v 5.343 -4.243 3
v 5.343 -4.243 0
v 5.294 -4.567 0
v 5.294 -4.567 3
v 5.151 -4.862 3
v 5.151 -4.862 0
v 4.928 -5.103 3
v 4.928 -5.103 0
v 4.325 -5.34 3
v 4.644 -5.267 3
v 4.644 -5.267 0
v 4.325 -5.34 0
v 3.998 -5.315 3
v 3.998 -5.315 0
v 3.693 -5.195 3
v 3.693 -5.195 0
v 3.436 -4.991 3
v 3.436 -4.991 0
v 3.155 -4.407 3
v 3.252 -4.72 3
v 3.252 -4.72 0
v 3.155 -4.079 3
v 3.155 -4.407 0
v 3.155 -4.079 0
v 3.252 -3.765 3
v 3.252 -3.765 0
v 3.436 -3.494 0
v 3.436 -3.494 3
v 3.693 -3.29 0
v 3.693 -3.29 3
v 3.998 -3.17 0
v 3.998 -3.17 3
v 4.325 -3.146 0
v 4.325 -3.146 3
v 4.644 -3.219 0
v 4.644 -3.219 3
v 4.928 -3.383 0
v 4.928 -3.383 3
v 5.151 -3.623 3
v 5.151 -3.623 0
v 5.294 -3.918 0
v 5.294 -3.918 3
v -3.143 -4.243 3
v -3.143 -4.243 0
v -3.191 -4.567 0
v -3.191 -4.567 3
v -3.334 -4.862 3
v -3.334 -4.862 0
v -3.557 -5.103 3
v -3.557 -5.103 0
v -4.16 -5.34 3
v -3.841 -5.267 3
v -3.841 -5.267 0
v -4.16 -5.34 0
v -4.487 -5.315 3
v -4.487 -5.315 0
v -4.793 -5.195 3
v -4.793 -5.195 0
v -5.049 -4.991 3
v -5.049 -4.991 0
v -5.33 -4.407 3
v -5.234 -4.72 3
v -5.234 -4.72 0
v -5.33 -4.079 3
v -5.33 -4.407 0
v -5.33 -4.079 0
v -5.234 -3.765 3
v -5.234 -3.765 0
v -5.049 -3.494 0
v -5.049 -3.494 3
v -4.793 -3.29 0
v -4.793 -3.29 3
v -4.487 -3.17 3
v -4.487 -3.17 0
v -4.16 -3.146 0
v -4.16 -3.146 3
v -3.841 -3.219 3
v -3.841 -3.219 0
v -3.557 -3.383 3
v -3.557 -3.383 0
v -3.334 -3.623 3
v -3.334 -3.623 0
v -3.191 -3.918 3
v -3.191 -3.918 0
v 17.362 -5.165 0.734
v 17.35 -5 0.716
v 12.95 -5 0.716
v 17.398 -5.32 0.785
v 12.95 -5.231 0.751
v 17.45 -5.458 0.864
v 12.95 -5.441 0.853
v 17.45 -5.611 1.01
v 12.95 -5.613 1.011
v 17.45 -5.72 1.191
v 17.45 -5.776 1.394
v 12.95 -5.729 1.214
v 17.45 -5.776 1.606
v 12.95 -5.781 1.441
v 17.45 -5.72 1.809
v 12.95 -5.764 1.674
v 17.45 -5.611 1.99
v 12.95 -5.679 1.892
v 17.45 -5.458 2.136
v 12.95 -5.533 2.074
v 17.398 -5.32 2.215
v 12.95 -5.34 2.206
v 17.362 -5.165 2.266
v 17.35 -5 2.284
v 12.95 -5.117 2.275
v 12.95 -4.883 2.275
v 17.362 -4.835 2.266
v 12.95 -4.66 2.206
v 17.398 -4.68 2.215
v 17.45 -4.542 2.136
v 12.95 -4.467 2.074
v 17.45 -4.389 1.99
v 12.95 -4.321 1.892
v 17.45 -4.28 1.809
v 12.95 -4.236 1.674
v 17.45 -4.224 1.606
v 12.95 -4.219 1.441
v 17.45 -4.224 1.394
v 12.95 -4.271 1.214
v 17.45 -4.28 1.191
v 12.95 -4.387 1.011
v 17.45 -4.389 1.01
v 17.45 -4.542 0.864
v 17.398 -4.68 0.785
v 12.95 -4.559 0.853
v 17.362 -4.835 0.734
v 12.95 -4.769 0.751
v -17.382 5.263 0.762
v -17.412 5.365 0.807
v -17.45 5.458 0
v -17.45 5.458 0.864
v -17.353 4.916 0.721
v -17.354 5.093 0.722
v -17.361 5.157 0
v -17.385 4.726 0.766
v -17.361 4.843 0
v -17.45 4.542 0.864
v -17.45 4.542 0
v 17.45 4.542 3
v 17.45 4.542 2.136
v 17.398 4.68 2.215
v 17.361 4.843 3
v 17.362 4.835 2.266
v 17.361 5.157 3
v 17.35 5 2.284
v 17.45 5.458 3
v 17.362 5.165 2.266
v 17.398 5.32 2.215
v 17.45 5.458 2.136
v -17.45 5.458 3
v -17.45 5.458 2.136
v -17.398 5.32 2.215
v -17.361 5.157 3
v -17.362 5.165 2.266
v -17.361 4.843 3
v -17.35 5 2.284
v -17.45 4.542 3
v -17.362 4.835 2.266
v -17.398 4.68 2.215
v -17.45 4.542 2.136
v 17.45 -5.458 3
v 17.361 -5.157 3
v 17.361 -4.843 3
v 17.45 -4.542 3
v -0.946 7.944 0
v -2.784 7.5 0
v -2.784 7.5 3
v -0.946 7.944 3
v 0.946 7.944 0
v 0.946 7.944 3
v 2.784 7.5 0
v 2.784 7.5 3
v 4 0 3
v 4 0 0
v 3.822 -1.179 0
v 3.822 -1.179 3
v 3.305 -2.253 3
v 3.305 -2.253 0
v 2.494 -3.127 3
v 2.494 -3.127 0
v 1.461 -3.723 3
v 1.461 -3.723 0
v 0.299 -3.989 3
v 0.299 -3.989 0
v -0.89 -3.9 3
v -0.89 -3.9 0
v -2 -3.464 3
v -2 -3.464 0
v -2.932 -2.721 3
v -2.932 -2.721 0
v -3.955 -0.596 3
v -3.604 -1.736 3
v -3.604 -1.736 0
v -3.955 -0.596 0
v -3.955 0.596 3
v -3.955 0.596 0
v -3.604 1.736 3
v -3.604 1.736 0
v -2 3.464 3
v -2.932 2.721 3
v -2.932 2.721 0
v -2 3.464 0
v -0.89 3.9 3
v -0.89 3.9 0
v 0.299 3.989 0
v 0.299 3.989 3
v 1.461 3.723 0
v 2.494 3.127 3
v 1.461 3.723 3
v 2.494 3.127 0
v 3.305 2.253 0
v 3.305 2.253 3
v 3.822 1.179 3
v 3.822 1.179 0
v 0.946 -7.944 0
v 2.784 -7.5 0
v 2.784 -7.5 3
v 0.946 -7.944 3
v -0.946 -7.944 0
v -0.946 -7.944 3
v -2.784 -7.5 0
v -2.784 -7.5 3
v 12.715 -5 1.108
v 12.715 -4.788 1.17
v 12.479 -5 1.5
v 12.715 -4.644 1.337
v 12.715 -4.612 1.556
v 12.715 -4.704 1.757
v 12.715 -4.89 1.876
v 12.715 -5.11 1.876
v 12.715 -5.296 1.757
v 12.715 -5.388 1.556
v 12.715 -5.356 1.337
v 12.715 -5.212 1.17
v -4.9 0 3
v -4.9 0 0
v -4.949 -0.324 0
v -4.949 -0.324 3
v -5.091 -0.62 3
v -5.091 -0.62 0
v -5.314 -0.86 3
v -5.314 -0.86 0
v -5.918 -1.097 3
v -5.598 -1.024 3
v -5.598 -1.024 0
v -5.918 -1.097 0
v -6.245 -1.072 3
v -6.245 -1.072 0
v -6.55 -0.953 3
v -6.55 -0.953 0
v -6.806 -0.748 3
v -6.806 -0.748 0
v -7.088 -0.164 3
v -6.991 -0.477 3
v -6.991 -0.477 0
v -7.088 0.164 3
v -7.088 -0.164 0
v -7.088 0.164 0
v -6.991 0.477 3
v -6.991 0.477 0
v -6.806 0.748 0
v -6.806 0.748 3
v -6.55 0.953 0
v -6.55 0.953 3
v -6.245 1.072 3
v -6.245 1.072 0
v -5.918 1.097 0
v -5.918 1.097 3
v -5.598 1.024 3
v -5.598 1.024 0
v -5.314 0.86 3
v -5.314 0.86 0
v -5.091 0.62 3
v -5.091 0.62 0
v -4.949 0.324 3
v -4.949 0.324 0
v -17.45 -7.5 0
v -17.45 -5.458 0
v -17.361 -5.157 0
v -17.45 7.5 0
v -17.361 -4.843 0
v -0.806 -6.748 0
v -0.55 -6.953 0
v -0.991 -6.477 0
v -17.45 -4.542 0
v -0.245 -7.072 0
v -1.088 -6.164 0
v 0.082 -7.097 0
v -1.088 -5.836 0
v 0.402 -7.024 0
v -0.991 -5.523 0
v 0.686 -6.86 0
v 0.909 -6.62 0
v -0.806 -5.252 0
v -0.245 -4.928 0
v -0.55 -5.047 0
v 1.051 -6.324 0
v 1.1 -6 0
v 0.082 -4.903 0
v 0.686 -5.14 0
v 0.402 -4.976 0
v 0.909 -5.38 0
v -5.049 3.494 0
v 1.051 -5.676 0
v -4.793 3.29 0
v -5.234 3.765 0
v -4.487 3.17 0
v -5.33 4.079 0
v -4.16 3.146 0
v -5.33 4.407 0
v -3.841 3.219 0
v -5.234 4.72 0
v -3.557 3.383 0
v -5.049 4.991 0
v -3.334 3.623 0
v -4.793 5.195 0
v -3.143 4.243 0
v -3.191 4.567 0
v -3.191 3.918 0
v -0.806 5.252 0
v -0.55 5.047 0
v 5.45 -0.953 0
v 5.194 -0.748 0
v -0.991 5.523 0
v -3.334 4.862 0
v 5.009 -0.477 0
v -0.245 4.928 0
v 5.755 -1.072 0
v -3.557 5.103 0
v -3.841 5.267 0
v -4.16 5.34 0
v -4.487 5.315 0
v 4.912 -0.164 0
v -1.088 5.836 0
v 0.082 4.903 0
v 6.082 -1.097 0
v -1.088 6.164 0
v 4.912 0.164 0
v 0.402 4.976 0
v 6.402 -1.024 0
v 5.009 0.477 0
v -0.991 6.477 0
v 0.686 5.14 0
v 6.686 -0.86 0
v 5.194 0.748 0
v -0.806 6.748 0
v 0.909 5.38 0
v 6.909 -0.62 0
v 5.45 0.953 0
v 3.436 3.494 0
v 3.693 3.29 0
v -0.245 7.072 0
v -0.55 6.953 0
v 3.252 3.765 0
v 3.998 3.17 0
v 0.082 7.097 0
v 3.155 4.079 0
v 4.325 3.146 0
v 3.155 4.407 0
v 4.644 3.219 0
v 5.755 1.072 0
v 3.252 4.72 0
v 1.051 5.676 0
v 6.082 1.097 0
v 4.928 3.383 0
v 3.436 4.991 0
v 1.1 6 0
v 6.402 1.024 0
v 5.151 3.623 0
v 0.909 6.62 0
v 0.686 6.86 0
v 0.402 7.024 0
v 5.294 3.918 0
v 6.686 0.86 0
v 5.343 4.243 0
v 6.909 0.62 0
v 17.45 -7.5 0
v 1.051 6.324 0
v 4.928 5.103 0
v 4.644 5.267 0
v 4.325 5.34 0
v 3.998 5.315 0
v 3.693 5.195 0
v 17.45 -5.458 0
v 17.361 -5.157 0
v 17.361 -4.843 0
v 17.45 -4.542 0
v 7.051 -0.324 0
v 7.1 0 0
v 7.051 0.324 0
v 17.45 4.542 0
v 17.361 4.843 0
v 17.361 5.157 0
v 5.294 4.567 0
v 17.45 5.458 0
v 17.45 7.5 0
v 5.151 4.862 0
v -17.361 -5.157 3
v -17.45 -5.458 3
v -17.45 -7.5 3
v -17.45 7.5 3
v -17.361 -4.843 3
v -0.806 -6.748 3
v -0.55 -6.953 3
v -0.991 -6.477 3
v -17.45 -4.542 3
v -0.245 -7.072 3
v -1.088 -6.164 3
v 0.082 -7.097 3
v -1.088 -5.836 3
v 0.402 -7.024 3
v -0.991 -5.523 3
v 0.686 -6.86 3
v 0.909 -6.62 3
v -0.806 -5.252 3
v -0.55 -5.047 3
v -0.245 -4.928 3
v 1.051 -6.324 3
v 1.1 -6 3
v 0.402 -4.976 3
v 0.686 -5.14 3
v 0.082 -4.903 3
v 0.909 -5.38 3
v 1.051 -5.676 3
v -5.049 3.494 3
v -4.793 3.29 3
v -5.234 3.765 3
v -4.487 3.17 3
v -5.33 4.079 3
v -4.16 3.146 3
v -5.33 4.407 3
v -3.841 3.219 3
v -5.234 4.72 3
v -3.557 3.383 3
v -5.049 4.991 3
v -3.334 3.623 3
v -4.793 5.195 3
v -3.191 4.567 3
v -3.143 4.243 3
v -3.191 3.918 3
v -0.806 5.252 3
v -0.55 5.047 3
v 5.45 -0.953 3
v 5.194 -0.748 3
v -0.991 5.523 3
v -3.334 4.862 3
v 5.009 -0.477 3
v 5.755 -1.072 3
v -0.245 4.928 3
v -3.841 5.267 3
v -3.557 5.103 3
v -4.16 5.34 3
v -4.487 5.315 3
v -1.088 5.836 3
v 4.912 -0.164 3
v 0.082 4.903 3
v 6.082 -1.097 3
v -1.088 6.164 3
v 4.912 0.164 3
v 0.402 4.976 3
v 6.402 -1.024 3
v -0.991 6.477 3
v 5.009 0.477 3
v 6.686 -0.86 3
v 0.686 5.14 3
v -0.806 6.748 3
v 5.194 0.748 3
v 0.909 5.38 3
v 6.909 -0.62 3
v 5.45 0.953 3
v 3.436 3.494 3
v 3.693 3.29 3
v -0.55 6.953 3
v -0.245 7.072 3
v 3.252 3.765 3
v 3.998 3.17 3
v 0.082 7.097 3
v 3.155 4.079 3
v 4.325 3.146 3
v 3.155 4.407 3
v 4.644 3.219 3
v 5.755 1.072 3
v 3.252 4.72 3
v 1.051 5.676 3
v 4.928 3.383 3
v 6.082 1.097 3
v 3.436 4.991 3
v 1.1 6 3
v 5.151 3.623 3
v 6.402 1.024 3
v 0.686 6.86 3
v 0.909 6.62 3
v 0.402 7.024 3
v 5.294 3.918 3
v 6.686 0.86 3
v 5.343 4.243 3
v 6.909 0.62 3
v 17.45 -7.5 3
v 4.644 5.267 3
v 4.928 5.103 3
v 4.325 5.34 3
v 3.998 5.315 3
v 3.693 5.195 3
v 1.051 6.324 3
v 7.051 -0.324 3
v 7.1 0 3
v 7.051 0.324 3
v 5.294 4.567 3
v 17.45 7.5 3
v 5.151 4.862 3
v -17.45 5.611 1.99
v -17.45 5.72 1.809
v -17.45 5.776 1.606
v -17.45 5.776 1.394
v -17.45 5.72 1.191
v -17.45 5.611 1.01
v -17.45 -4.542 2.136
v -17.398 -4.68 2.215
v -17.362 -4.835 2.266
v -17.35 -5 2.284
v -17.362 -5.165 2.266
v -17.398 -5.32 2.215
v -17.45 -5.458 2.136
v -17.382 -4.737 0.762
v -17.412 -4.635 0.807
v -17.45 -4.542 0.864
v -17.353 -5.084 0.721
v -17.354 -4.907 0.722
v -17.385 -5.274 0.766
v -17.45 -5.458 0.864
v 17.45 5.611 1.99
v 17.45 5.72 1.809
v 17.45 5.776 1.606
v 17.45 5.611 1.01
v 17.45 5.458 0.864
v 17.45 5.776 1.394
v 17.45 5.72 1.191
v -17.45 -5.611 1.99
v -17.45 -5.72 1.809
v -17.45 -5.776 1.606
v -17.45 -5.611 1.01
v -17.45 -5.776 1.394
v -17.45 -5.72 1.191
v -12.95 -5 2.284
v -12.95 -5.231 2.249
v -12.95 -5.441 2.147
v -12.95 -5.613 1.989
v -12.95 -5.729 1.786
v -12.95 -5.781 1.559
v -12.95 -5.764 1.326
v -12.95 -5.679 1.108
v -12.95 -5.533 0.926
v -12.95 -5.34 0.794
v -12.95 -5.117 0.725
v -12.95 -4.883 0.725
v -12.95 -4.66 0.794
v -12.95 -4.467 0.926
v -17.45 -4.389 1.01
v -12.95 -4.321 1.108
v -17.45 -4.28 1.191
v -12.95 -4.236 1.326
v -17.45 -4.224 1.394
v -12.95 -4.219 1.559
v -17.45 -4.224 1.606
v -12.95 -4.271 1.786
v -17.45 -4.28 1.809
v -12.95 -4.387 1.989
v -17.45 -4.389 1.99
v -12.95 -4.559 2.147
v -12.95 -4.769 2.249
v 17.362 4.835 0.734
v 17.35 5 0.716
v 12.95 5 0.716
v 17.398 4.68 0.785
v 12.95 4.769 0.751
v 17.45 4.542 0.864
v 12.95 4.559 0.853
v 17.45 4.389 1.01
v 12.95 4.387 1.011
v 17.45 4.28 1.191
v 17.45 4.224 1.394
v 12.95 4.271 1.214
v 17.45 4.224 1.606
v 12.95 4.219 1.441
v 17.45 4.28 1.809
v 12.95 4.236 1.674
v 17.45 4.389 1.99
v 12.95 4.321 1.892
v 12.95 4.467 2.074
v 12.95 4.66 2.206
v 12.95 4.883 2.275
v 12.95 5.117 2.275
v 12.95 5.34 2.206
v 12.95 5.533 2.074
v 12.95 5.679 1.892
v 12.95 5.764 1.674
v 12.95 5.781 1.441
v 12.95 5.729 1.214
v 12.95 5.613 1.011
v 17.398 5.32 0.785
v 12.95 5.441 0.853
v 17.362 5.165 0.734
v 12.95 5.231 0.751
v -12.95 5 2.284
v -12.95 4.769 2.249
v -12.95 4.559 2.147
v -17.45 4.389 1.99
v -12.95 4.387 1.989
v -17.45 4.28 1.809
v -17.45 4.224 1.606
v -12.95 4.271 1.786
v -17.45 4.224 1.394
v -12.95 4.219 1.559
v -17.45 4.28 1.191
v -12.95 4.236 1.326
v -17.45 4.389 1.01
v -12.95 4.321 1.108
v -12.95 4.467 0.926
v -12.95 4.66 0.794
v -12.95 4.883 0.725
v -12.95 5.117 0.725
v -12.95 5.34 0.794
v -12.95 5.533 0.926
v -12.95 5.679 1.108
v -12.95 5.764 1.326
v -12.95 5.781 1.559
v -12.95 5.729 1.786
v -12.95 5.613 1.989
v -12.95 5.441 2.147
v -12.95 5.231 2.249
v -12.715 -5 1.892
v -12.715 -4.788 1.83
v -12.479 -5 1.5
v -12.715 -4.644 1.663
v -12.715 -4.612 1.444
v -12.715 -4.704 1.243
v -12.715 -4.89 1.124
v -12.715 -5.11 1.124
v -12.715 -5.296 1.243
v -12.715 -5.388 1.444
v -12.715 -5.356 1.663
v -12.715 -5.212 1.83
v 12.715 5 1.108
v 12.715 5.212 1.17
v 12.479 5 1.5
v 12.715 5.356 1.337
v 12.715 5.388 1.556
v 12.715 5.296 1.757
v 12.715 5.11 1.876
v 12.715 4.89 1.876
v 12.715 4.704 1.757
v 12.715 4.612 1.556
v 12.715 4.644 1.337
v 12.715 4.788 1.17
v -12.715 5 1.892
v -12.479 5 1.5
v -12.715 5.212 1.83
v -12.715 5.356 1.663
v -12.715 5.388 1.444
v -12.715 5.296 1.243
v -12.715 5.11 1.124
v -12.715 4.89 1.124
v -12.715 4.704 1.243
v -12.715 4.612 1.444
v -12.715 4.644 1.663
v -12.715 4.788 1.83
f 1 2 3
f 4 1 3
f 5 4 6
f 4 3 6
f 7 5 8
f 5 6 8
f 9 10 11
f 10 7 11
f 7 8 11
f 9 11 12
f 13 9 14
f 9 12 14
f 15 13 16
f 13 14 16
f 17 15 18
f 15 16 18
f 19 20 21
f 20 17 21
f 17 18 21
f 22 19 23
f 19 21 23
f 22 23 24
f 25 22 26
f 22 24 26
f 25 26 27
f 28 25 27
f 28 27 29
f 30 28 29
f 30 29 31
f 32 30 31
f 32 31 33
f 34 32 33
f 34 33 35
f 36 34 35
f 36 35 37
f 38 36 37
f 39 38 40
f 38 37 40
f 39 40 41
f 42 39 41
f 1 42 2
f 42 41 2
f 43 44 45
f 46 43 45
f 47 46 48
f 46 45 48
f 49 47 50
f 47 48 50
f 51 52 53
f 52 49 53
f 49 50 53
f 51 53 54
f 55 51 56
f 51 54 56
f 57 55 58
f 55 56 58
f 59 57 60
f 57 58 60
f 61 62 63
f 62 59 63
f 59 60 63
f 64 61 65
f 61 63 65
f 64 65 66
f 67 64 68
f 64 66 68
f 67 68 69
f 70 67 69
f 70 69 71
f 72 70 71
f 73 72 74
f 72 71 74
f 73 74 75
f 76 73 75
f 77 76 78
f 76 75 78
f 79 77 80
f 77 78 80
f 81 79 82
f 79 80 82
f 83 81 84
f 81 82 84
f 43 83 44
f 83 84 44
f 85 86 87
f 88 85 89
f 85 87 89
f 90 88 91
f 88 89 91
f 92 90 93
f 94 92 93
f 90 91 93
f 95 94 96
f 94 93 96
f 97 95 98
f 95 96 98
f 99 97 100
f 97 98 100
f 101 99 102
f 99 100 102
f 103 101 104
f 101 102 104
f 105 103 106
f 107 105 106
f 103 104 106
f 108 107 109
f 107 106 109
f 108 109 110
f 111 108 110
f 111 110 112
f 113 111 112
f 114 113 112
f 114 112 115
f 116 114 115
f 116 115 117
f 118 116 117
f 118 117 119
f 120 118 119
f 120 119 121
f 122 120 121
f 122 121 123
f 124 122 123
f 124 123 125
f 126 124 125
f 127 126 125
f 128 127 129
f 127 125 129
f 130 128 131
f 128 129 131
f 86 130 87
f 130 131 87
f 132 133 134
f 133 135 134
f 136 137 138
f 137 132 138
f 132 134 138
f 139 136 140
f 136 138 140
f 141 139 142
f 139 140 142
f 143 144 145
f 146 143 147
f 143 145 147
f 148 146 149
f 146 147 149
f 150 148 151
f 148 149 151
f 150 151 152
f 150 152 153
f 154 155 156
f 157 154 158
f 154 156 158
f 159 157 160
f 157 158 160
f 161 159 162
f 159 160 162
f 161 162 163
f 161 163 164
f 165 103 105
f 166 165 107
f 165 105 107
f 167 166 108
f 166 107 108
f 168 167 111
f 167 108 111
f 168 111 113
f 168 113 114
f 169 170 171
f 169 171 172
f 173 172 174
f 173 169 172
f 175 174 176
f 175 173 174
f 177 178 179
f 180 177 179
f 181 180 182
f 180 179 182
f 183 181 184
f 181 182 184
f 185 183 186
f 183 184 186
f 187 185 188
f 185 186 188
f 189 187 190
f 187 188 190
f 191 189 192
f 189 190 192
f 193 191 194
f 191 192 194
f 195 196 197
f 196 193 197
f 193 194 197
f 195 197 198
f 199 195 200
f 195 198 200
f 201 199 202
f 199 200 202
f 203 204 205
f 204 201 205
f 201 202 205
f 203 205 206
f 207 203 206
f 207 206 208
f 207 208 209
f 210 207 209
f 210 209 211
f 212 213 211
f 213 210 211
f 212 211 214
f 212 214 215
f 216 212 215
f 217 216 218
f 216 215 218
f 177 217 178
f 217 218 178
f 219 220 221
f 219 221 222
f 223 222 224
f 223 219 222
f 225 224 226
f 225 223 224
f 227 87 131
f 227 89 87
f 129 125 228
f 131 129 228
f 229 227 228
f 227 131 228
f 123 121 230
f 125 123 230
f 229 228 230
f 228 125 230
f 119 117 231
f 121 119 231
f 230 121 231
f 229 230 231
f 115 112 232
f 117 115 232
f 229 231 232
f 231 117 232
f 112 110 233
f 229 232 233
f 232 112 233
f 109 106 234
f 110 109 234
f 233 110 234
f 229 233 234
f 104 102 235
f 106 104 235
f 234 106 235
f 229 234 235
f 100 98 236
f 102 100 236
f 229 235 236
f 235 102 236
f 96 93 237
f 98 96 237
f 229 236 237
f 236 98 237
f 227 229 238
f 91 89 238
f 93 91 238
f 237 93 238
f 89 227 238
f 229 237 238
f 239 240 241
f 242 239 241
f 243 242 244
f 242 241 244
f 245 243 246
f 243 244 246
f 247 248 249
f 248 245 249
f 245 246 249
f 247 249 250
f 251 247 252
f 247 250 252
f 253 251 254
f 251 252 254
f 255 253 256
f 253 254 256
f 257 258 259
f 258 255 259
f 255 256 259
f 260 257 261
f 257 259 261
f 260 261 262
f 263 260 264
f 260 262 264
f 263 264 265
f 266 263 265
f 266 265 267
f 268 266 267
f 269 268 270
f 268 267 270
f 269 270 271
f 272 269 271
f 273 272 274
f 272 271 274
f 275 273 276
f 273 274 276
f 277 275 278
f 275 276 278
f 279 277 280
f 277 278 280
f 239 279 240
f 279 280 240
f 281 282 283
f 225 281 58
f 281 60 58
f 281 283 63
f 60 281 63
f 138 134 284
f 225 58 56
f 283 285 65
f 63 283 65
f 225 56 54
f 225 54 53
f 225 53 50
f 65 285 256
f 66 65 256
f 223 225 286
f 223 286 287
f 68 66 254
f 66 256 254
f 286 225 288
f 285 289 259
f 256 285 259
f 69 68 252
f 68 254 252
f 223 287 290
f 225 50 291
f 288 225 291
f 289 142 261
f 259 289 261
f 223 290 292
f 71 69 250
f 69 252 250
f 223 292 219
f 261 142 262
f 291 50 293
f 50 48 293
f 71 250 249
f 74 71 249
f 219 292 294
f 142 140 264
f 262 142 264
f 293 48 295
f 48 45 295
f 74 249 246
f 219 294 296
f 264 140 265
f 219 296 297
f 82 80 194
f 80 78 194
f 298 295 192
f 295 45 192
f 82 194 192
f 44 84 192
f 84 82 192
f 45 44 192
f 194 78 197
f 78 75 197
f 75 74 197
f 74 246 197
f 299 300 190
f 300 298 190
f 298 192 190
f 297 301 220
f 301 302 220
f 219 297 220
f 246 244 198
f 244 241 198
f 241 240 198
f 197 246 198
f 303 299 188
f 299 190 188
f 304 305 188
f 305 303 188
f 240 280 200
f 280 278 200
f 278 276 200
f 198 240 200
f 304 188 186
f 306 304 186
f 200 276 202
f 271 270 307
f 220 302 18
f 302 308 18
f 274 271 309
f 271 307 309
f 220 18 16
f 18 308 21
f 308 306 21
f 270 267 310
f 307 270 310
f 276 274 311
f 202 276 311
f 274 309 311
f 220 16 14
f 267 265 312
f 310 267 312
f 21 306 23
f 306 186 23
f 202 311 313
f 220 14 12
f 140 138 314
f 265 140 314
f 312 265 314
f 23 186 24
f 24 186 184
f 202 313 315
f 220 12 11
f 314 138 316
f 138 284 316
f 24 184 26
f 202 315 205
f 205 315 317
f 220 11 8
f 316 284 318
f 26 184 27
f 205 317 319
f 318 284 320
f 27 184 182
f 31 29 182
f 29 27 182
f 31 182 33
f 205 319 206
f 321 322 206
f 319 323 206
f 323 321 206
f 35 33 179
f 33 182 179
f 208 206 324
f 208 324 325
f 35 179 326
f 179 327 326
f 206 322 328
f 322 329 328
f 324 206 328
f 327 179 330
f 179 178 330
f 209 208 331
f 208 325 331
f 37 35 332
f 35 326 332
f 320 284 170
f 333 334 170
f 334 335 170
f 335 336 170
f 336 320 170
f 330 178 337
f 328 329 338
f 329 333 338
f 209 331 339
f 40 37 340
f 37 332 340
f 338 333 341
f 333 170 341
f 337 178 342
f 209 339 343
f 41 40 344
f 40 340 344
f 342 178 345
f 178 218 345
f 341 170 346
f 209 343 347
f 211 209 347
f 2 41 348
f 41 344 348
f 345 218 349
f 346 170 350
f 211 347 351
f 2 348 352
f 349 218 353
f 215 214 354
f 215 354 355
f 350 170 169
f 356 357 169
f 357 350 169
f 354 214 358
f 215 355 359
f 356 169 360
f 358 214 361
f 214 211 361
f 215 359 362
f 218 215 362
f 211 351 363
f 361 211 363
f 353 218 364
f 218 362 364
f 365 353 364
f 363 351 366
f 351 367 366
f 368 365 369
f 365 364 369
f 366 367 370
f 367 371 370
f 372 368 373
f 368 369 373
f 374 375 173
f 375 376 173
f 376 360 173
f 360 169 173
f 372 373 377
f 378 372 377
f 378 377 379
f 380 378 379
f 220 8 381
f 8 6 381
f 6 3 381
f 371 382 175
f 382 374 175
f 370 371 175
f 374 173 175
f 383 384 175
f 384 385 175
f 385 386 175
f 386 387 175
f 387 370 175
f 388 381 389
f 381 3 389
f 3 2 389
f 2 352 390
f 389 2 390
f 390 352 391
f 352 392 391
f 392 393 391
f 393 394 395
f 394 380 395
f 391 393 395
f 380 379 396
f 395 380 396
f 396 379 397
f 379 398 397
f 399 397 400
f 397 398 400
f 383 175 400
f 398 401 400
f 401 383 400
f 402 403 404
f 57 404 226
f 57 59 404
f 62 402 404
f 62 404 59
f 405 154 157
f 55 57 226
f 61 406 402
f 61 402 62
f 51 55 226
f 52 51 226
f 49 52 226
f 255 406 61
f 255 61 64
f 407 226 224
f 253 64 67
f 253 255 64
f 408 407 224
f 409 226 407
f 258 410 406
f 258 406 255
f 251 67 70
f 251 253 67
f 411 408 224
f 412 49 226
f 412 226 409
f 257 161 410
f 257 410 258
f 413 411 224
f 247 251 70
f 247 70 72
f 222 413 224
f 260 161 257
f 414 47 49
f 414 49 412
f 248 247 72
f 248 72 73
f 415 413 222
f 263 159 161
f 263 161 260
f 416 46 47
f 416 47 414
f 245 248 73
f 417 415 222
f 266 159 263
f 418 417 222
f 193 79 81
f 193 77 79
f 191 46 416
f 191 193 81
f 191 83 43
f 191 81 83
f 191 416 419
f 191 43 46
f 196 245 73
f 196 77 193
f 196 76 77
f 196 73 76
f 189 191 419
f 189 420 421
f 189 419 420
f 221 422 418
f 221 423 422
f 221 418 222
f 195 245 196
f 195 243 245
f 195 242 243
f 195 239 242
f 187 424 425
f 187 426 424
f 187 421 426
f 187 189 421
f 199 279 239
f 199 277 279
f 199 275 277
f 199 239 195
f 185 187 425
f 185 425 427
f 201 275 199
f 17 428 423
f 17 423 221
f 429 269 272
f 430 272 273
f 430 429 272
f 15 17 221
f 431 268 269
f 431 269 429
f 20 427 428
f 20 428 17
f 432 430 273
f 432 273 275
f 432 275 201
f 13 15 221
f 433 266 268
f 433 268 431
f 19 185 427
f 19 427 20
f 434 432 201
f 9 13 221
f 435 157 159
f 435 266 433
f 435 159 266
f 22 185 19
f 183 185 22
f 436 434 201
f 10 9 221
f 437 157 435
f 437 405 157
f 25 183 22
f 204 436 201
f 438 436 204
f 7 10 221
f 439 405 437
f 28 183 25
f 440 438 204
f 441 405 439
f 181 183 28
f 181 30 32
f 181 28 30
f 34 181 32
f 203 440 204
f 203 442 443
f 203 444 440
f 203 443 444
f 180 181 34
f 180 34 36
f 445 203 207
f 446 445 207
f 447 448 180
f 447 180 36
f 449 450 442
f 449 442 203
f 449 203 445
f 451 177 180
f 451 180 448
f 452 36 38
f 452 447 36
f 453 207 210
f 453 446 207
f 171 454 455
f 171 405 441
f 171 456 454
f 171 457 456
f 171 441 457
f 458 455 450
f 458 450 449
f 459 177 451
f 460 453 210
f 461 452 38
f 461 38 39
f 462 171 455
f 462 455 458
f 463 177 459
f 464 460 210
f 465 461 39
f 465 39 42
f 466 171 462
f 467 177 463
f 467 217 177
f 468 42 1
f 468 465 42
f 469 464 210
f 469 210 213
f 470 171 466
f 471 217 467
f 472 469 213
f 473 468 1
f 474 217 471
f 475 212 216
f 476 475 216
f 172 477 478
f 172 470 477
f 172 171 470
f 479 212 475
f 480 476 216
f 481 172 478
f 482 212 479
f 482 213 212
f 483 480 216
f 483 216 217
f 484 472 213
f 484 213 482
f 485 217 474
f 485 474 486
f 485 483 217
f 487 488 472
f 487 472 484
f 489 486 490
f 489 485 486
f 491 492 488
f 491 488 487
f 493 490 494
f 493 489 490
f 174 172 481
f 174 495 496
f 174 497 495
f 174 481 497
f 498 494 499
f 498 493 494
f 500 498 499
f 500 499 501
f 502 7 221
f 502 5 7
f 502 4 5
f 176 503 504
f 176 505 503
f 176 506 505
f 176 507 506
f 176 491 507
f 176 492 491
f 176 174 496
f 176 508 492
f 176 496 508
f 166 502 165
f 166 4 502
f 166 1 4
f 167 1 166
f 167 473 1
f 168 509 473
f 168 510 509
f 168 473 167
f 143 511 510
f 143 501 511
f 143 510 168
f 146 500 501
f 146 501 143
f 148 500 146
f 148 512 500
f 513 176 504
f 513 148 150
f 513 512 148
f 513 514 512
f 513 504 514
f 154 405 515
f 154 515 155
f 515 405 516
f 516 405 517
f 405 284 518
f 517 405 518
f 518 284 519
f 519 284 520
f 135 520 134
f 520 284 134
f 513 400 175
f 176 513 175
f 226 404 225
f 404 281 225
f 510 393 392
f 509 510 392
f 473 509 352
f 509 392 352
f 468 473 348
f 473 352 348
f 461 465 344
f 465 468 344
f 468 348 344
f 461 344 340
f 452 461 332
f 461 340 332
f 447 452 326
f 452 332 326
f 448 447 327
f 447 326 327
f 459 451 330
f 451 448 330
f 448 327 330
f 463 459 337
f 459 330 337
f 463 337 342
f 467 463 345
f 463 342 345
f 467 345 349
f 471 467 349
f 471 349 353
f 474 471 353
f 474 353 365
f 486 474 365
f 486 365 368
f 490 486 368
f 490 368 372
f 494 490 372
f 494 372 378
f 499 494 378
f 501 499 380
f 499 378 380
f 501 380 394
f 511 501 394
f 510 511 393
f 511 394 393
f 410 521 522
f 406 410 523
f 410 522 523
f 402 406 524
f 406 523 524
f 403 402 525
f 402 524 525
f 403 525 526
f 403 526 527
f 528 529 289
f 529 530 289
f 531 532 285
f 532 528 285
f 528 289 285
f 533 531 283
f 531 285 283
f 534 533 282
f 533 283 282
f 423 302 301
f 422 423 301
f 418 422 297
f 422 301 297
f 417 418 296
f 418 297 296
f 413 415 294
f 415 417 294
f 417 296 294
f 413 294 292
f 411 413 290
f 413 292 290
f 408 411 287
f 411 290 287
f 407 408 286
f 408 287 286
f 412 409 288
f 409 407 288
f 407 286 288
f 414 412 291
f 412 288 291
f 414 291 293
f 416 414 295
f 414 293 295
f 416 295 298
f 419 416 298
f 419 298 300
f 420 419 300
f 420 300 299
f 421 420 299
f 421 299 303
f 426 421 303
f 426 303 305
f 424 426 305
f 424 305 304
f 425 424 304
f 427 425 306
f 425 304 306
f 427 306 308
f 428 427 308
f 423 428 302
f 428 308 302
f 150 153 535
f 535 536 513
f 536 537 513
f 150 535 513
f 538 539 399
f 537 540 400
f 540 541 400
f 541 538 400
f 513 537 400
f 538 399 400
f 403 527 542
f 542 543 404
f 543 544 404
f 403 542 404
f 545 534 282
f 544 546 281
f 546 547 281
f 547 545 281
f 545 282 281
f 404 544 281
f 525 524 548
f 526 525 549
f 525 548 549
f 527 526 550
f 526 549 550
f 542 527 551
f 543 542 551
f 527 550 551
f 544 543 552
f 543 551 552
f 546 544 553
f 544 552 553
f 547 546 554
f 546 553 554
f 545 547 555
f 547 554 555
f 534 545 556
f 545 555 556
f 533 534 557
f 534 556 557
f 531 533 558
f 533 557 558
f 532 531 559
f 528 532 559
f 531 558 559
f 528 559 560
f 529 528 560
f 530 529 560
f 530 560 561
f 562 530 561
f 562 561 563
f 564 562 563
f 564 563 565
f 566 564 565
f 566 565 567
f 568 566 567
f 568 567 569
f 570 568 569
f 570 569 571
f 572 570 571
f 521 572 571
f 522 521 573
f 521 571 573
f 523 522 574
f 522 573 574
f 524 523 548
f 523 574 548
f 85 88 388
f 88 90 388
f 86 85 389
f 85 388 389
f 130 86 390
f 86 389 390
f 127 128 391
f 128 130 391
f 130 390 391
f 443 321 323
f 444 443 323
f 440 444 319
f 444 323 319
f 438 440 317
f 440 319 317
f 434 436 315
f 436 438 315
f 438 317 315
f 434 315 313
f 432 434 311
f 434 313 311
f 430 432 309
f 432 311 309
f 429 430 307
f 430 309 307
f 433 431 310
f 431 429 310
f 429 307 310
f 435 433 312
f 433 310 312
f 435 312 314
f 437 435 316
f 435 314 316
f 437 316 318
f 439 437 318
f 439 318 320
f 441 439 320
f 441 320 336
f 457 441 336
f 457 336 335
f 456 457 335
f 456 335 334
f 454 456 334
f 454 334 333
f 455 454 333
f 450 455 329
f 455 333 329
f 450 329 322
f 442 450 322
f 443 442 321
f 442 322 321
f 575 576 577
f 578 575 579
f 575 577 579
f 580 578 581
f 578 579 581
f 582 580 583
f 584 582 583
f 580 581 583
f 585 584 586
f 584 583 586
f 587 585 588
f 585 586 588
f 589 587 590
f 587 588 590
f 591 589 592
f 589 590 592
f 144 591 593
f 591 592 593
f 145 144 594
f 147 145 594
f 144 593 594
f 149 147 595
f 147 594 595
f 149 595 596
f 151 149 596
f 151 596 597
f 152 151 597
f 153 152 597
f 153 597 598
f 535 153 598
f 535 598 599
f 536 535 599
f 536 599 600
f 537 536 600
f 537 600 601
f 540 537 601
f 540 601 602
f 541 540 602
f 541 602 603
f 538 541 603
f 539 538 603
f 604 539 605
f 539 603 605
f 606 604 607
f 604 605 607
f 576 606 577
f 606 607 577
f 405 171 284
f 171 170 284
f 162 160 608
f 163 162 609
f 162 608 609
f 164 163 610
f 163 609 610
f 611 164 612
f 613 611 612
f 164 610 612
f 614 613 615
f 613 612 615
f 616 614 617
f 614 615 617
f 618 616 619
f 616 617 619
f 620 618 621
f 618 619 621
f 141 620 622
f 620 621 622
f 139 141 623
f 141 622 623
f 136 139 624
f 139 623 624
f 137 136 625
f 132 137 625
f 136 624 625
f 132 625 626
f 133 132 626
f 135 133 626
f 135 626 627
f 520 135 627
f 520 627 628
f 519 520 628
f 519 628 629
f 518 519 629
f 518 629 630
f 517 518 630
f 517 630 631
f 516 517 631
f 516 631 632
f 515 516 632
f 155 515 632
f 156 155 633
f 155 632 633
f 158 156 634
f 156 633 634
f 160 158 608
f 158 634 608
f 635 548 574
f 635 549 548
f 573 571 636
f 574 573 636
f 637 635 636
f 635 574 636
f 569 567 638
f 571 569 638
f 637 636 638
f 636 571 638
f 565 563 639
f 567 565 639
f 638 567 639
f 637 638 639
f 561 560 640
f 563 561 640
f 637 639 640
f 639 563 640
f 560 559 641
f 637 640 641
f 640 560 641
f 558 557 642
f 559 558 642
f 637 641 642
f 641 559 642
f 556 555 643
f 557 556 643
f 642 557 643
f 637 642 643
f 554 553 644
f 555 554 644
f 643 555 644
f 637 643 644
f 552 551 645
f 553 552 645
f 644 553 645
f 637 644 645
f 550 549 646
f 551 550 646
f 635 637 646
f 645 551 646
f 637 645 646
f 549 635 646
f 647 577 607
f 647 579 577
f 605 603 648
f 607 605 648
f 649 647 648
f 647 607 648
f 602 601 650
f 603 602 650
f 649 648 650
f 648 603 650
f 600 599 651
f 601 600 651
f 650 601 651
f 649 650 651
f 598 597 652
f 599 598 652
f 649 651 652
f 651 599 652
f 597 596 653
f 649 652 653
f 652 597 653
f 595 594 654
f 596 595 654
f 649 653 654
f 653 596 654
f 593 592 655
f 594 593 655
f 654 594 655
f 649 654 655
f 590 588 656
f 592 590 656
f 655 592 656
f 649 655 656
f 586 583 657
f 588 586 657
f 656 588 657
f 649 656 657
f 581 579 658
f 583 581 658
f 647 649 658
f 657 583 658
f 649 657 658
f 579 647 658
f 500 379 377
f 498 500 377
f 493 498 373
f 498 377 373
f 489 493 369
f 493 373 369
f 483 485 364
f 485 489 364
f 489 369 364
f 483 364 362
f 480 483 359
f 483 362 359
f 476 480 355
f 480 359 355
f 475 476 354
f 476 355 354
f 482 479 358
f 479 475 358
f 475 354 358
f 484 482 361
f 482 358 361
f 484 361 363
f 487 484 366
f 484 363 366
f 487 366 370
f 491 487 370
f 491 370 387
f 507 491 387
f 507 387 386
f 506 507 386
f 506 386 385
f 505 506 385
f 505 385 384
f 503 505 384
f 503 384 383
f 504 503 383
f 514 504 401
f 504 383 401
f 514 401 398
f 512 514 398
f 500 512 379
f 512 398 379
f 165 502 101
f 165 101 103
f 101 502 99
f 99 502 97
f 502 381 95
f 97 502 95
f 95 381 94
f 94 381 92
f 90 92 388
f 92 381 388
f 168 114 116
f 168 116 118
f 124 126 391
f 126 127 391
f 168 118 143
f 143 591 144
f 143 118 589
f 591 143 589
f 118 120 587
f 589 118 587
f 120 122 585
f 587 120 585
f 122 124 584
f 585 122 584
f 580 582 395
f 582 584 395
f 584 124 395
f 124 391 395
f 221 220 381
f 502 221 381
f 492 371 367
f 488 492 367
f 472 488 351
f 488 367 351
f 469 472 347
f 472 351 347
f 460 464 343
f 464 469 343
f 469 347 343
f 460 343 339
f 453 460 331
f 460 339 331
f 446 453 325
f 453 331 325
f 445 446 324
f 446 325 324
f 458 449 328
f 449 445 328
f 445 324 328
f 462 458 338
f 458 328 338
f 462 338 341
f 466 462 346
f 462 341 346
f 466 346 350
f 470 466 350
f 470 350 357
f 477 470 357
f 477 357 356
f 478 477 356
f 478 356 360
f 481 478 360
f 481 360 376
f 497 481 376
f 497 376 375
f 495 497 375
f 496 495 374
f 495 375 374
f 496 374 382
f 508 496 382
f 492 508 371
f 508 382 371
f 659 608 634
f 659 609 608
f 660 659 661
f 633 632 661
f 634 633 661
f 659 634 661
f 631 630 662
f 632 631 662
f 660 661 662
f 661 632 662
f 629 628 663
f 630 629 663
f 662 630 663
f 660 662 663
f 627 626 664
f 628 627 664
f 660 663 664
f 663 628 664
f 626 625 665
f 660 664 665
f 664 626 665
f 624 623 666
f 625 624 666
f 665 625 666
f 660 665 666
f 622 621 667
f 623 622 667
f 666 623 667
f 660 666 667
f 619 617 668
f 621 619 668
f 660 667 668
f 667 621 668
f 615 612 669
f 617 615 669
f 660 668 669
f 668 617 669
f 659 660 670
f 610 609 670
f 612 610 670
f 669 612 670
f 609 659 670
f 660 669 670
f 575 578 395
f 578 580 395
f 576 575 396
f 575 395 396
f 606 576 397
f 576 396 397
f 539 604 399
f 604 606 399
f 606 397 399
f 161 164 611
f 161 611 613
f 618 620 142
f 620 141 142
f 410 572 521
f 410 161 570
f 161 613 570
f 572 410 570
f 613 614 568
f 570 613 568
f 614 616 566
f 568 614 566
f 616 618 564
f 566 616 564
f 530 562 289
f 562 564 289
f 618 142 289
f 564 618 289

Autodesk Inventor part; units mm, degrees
ref_plane "YZ Plane" through (0, 0, 0) normal (1, 0, 0) x (0, 1, 0)
ref_plane "XZ Plane" through (0, 0, 0) normal (0, 1, 0) x (-1, 0, 0)
ref_plane "XY Plane" through (0, 0, 0) normal (0, 0, 1) x (1, 0, 0)
sketch "スケッチ1" plane through (0, 0, 0) normal (0, 0, 1) x (1, 0, 0)
  circle A0 centre (0, 0) radius 4
  circle A1 centre (0, 0) radius 8
  circle A2 centre (0, 0) radius 6 construction
  circle A3 centre (0, 6) radius 1.1
  circle A4 centre (-4.2426, 4.2426) radius 1.1
  circle A5 centre (-6, 0) radius 1.1
  circle A6 centre (-4.2426, -4.2426) radius 1.1
  circle A7 centre (0, -6) radius 1.1
  circle A8 centre (4.2426, -4.2426) radius 1.1
  circle A9 centre (6, 0) radius 1.1
  circle A10 centre (4.2426, 4.2426) radius 1.1
  line L0 (-17.45, -7.5) -> (17.45, -7.5)
  line L1 (17.45, -7.5) -> (17.45, 7.5)
  line L2 (17.45, 7.5) -> (-17.45, 7.5)
  line L3 (-17.45, 7.5) -> (-17.45, -7.5)
  line L4 (-17.45, -7.5) -> (17.45, 7.5) construction
  line L5 (17.45, -7.5) -> (-17.45, 7.5) construction
  point P0 (2.7839, 7.5)
  point P1 (-2.7839, 7.5)
  point P2 (2.7839, -7.5)
  point P3 (-2.7839, -7.5)
  dimension "d2" = 12
  dimension "d0" = 8
  dimension "d1" = 16
  dimension "d3" = 2.2
  dimension "d6" = 360
  dimension "d8" = 34.9
  dimension "d9" = 15
extrude "押し出し1" add sketch "スケッチ1" along normal blind 3
sketch "スケッチ2" plane through (17.45, -7.5, 0) normal (1, 0, 0) x (0, 0, -1)
  line L0 (0, 7.5) -> (-3, 7.5) construction
  line L1 (-3, 0) -> (-3, 15) construction
  line L2 (-1.5, 7.5) -> (-1.5, 15) construction
  line L3 (0, 15) -> (-3, 15) construction
  point P0 (-1.5, 12.5)
  point P1 (-1.5, 2.5)
  dimension "d12" = 5
hole "穴1" at (17.45, 5, 1.5) at (17.45, -5, 1.5) direction (-1, 0, 0) diameter 1.567 depth 4.5 tip angle 118 thread size "M2x0.4" class "6H" standard "ISO Metric profile"
sketch "スケッチ3" plane through (-17.45, -7.5, 0) normal (-1, 0, 0) x (0, 0, 1)
  circle A0 centre (1.5, 2.5) radius 0.7835 projected
  circle A1 centre (1.5, 12.5) radius 0.7835 projected
  point P0 (0, 7.5)
  point P1 (1.5, 2.5)
  point P2 (1.5, 12.5)
hole "穴2" at (-17.45, -5, 1.5) at (-17.45, 5, 1.5) direction (1, 0, 0) diameter 1.567 depth 4.5 tip angle 118 thread size "M2x0.4" class "6H" standard "ISO Metric profile"
sketch "スケッチ4" plane through (0, 0, 0) normal (0, 0, -1) x (-1, 0, 0)
  line L0 (17.45, -4.2165) -> (17.45, -5.7835) projected
  circle A0 centre (0, -6) radius 1.1 projected
  line L1 (0, -6) -> (0, 0) construction
  circle A1 centre (18.45, -5) radius 1.1
  circle A2 centre (6, 0) radius 1.1 construction
  line L2 (0, 0) -> (6, 0) construction
  circle A3 centre (18.45, 5) radius 1.1
  line L3 (-17.45, -4.2165) -> (-17.45, -5.7835)
  circle A4 centre (-18.45, -5) radius 1.1
  circle A5 centre (-18.45, 5) radius 1.1
  point P0 (17.45, -5)
  point P1 (-17.45, -5)
  dimension "d27" = 2.2
  dimension "d28" = 1
extrude "押し出し2" cut sketch "スケッチ4" against normal blind 3 contours A1 L0 | L0 A1 | A3 | A4 L3 | L3 A4 | A5
properties part number "udeyi"
